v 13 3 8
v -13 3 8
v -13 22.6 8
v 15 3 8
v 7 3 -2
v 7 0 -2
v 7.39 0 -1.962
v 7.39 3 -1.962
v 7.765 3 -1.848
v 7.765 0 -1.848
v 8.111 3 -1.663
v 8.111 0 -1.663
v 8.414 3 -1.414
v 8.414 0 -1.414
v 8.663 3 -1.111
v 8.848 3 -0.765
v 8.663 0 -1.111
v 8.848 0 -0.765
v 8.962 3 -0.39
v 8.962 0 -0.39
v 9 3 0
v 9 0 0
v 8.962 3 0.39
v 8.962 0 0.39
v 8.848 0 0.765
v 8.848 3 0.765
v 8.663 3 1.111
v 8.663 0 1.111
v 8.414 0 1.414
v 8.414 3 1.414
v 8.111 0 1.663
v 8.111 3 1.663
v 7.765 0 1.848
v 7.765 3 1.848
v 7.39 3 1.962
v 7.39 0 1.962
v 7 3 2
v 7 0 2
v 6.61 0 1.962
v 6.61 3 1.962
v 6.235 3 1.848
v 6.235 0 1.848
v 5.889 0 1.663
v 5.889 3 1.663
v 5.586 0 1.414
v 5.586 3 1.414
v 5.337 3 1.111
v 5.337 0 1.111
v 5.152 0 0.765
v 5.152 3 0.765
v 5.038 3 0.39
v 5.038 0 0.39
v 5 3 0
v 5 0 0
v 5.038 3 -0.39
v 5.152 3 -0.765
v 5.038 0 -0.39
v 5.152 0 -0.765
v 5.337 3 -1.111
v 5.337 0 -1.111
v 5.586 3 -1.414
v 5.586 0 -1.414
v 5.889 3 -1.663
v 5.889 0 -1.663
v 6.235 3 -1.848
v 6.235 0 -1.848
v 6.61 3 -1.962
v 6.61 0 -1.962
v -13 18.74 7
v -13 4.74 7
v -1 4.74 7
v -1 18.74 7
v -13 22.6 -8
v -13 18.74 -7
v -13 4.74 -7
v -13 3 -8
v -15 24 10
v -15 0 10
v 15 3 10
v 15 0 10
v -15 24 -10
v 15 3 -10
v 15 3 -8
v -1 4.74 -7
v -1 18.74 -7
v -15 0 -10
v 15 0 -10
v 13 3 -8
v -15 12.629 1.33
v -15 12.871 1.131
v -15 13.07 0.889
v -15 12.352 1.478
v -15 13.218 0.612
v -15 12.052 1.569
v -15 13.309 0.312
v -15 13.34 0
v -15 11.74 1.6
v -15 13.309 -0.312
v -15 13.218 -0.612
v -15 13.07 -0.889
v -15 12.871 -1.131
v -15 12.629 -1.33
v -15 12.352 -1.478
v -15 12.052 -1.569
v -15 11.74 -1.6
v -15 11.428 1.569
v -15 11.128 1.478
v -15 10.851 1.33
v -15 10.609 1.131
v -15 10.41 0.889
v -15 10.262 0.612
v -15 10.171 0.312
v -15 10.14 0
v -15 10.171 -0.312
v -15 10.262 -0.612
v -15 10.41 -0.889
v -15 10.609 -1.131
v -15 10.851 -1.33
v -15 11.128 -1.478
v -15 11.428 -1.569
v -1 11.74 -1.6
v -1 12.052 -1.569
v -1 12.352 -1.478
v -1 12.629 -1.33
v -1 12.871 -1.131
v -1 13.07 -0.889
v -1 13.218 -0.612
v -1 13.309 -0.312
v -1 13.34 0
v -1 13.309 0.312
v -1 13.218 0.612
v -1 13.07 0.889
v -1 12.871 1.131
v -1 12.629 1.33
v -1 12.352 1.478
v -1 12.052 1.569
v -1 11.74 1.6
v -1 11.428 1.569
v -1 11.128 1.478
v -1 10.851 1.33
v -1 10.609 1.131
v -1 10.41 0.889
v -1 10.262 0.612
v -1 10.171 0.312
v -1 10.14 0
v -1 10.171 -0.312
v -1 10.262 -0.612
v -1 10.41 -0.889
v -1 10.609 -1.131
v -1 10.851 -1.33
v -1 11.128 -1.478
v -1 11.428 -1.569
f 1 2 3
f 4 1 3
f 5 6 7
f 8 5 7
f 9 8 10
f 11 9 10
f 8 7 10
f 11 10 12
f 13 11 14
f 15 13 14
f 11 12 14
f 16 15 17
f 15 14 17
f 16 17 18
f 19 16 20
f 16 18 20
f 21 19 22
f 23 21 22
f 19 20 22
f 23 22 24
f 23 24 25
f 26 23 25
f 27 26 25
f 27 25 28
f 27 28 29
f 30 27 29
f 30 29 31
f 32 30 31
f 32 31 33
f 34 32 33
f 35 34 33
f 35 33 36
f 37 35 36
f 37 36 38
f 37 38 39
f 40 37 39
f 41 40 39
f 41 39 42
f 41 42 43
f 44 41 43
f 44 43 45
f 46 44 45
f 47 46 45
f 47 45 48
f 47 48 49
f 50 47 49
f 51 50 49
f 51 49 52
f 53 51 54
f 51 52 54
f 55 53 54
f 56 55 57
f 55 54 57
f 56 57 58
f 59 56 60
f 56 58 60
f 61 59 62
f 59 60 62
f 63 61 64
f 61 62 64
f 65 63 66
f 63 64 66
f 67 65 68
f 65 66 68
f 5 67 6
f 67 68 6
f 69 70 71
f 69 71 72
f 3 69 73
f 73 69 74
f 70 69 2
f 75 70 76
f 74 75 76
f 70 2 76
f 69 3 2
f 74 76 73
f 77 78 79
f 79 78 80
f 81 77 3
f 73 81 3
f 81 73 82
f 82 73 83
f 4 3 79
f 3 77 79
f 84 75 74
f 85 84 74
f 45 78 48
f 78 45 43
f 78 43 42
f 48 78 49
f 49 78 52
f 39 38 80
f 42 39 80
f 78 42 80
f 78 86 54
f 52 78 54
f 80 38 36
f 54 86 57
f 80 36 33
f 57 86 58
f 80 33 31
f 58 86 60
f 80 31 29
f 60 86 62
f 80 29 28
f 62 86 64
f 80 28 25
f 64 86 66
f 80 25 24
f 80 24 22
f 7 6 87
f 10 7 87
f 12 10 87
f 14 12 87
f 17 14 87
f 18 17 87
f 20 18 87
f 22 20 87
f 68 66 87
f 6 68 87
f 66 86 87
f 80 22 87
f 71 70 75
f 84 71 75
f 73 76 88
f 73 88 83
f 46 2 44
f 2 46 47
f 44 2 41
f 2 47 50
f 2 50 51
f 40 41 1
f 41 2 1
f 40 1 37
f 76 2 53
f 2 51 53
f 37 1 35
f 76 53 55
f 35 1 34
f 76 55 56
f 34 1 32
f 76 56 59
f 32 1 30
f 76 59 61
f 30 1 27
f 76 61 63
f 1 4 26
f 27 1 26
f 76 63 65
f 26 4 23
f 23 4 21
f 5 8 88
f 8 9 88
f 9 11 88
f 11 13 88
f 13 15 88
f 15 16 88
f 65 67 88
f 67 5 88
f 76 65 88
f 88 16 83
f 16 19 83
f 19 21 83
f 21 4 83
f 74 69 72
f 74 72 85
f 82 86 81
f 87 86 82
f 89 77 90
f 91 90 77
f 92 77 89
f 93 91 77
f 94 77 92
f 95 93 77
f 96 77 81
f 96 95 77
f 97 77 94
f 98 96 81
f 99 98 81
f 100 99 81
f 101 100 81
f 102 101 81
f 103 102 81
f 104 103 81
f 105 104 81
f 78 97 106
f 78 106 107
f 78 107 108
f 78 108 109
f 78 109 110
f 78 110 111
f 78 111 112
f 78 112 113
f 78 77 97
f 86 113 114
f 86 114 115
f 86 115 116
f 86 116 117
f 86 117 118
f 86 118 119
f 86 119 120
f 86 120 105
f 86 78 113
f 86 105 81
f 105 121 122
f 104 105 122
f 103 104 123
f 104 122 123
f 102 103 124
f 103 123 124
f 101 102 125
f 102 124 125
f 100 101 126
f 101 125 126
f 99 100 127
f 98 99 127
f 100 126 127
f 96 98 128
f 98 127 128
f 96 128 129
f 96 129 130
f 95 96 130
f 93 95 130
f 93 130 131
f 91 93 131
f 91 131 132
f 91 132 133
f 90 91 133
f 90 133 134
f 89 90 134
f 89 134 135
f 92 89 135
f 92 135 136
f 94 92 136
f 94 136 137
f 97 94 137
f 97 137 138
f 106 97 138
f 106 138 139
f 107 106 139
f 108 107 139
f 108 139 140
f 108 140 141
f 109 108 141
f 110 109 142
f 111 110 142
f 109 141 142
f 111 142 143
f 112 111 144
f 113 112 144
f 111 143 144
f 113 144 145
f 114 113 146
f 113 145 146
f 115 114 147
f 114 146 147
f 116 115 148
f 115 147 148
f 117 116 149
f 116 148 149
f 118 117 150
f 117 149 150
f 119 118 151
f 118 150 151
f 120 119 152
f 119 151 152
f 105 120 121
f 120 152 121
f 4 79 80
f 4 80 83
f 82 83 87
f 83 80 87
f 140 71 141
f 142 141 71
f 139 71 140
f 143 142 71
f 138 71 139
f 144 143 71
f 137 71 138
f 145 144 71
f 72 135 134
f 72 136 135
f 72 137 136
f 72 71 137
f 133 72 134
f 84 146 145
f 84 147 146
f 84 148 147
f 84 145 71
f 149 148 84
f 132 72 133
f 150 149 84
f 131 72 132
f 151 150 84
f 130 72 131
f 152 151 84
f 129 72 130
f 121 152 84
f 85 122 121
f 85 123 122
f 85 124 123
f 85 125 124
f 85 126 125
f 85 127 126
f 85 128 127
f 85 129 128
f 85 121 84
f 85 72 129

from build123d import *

# Parameters (mm, degrees)
CROQUIS1_W              = 30
CROQUIS1_H              = 20
SALIENTE_EXTRUIR1_DEPTH = 24
CORTAR_EXTRUIR1_DEPTH   = 35.655446902
VACIADO1_T              = -2
CROQUIS5_W              = 16
CROQUIS5_H              = 7.775934249
CORTAR_EXTRUIR3_DEPTH   = 24
SALIENTE_EXTRUIR2_REACH = 41.699
CROQUIS6_W              = 16
CROQUIS6_H              = 3
CROQUIS7_W              = 14
CROQUIS7_H              = 14
SALIENTE_EXTRUIR3_DEPTH = 12
CROQUIS8_R              = 1.6
CORTAR_EXTRUIR5_DEPTH   = 31.528675045
CROQUIS9_R              = 2
CORTAR_EXTRUIR6_DEPTH   = 12


with BuildPart() as part:
    # Croquis1 → Saliente-Extruir1 (new body)
    with BuildSketch(Plane(origin=(0, 0, 0), x_dir=(1, 0, 0), z_dir=(0, 1, 0))):
        Rectangle(CROQUIS1_W, CROQUIS1_H)
    extrude(amount=SALIENTE_EXTRUIR1_DEPTH)

    # Croquis2 → Cortar-Extruir1 (cut, through all)
    with BuildSketch(Plane.XY.offset(10)):
        Polygon((-15, 24), (15, 3), (15, 24), align=None)
    extrude(amount=-CORTAR_EXTRUIR1_DEPTH, mode=Mode.SUBTRACT)

    # Vaciado1
    vaciado1_openings = [part.faces().sort_by_distance(p)[0] for p in [
        (0, 13.5, 0),
    ]]
    offset(amount=VACIADO1_T, openings=vaciado1_openings, kind=Kind.INTERSECTION)

    # Croquis5 → Cortar-Extruir3 (cut)
    with BuildSketch(Plane(origin=(15, 0, 0), x_dir=(0, 0, -1), z_dir=(1, 0, 0))):
        with Locations((0, 6.887967125)):
            Rectangle(CROQUIS5_W, CROQUIS5_H)
    extrude(amount=-CORTAR_EXTRUIR3_DEPTH, mode=Mode.SUBTRACT)

    # Croquis6 → Saliente-Extruir2 (add, up to next)
    with BuildSketch(Plane(origin=(15, 0, 0), x_dir=(0, 0, -1), z_dir=(1, 0, 0)), mode=Mode.PRIVATE) as saliente_extruir2_sk1:
        with Locations((0, 1.5)):
            Rectangle(CROQUIS6_W, CROQUIS6_H)
    saliente_extruir2_tool1 = extrude(saliente_extruir2_sk1.sketch, amount=-SALIENTE_EXTRUIR2_REACH, mode=Mode.PRIVATE) - part.part
    add(saliente_extruir2_tool1.solids().sort_by_distance((15, 1.5, 0))[0])

    # Croquis7 → Saliente-Extruir3 (add)
    with BuildSketch(Plane(origin=(-13, 0, 0), x_dir=(0, 0, -1), z_dir=(1, 0, 0))):
        with Locations((0, 11.74)):
            Rectangle(CROQUIS7_W, CROQUIS7_H)
    extrude(amount=SALIENTE_EXTRUIR3_DEPTH)

    # Croquis8 → Cortar-Extruir5 (cut, through all)
    with BuildSketch(Plane(origin=(-1, 0, 0), x_dir=(0, 0, -1), z_dir=(1, 0, 0))):
        with Locations((0, 11.74)):
            Circle(CROQUIS8_R)
    extrude(amount=-CORTAR_EXTRUIR5_DEPTH, mode=Mode.SUBTRACT)

    # Croquis9 → Cortar-Extruir6 (cut)
    with BuildSketch(Plane.XZ):
        with Locations(Location((7, 0, 0), (0, 0, 270))):
            Circle(CROQUIS9_R)
    extrude(amount=-CORTAR_EXTRUIR6_DEPTH, mode=Mode.SUBTRACT)


solid = part.part
